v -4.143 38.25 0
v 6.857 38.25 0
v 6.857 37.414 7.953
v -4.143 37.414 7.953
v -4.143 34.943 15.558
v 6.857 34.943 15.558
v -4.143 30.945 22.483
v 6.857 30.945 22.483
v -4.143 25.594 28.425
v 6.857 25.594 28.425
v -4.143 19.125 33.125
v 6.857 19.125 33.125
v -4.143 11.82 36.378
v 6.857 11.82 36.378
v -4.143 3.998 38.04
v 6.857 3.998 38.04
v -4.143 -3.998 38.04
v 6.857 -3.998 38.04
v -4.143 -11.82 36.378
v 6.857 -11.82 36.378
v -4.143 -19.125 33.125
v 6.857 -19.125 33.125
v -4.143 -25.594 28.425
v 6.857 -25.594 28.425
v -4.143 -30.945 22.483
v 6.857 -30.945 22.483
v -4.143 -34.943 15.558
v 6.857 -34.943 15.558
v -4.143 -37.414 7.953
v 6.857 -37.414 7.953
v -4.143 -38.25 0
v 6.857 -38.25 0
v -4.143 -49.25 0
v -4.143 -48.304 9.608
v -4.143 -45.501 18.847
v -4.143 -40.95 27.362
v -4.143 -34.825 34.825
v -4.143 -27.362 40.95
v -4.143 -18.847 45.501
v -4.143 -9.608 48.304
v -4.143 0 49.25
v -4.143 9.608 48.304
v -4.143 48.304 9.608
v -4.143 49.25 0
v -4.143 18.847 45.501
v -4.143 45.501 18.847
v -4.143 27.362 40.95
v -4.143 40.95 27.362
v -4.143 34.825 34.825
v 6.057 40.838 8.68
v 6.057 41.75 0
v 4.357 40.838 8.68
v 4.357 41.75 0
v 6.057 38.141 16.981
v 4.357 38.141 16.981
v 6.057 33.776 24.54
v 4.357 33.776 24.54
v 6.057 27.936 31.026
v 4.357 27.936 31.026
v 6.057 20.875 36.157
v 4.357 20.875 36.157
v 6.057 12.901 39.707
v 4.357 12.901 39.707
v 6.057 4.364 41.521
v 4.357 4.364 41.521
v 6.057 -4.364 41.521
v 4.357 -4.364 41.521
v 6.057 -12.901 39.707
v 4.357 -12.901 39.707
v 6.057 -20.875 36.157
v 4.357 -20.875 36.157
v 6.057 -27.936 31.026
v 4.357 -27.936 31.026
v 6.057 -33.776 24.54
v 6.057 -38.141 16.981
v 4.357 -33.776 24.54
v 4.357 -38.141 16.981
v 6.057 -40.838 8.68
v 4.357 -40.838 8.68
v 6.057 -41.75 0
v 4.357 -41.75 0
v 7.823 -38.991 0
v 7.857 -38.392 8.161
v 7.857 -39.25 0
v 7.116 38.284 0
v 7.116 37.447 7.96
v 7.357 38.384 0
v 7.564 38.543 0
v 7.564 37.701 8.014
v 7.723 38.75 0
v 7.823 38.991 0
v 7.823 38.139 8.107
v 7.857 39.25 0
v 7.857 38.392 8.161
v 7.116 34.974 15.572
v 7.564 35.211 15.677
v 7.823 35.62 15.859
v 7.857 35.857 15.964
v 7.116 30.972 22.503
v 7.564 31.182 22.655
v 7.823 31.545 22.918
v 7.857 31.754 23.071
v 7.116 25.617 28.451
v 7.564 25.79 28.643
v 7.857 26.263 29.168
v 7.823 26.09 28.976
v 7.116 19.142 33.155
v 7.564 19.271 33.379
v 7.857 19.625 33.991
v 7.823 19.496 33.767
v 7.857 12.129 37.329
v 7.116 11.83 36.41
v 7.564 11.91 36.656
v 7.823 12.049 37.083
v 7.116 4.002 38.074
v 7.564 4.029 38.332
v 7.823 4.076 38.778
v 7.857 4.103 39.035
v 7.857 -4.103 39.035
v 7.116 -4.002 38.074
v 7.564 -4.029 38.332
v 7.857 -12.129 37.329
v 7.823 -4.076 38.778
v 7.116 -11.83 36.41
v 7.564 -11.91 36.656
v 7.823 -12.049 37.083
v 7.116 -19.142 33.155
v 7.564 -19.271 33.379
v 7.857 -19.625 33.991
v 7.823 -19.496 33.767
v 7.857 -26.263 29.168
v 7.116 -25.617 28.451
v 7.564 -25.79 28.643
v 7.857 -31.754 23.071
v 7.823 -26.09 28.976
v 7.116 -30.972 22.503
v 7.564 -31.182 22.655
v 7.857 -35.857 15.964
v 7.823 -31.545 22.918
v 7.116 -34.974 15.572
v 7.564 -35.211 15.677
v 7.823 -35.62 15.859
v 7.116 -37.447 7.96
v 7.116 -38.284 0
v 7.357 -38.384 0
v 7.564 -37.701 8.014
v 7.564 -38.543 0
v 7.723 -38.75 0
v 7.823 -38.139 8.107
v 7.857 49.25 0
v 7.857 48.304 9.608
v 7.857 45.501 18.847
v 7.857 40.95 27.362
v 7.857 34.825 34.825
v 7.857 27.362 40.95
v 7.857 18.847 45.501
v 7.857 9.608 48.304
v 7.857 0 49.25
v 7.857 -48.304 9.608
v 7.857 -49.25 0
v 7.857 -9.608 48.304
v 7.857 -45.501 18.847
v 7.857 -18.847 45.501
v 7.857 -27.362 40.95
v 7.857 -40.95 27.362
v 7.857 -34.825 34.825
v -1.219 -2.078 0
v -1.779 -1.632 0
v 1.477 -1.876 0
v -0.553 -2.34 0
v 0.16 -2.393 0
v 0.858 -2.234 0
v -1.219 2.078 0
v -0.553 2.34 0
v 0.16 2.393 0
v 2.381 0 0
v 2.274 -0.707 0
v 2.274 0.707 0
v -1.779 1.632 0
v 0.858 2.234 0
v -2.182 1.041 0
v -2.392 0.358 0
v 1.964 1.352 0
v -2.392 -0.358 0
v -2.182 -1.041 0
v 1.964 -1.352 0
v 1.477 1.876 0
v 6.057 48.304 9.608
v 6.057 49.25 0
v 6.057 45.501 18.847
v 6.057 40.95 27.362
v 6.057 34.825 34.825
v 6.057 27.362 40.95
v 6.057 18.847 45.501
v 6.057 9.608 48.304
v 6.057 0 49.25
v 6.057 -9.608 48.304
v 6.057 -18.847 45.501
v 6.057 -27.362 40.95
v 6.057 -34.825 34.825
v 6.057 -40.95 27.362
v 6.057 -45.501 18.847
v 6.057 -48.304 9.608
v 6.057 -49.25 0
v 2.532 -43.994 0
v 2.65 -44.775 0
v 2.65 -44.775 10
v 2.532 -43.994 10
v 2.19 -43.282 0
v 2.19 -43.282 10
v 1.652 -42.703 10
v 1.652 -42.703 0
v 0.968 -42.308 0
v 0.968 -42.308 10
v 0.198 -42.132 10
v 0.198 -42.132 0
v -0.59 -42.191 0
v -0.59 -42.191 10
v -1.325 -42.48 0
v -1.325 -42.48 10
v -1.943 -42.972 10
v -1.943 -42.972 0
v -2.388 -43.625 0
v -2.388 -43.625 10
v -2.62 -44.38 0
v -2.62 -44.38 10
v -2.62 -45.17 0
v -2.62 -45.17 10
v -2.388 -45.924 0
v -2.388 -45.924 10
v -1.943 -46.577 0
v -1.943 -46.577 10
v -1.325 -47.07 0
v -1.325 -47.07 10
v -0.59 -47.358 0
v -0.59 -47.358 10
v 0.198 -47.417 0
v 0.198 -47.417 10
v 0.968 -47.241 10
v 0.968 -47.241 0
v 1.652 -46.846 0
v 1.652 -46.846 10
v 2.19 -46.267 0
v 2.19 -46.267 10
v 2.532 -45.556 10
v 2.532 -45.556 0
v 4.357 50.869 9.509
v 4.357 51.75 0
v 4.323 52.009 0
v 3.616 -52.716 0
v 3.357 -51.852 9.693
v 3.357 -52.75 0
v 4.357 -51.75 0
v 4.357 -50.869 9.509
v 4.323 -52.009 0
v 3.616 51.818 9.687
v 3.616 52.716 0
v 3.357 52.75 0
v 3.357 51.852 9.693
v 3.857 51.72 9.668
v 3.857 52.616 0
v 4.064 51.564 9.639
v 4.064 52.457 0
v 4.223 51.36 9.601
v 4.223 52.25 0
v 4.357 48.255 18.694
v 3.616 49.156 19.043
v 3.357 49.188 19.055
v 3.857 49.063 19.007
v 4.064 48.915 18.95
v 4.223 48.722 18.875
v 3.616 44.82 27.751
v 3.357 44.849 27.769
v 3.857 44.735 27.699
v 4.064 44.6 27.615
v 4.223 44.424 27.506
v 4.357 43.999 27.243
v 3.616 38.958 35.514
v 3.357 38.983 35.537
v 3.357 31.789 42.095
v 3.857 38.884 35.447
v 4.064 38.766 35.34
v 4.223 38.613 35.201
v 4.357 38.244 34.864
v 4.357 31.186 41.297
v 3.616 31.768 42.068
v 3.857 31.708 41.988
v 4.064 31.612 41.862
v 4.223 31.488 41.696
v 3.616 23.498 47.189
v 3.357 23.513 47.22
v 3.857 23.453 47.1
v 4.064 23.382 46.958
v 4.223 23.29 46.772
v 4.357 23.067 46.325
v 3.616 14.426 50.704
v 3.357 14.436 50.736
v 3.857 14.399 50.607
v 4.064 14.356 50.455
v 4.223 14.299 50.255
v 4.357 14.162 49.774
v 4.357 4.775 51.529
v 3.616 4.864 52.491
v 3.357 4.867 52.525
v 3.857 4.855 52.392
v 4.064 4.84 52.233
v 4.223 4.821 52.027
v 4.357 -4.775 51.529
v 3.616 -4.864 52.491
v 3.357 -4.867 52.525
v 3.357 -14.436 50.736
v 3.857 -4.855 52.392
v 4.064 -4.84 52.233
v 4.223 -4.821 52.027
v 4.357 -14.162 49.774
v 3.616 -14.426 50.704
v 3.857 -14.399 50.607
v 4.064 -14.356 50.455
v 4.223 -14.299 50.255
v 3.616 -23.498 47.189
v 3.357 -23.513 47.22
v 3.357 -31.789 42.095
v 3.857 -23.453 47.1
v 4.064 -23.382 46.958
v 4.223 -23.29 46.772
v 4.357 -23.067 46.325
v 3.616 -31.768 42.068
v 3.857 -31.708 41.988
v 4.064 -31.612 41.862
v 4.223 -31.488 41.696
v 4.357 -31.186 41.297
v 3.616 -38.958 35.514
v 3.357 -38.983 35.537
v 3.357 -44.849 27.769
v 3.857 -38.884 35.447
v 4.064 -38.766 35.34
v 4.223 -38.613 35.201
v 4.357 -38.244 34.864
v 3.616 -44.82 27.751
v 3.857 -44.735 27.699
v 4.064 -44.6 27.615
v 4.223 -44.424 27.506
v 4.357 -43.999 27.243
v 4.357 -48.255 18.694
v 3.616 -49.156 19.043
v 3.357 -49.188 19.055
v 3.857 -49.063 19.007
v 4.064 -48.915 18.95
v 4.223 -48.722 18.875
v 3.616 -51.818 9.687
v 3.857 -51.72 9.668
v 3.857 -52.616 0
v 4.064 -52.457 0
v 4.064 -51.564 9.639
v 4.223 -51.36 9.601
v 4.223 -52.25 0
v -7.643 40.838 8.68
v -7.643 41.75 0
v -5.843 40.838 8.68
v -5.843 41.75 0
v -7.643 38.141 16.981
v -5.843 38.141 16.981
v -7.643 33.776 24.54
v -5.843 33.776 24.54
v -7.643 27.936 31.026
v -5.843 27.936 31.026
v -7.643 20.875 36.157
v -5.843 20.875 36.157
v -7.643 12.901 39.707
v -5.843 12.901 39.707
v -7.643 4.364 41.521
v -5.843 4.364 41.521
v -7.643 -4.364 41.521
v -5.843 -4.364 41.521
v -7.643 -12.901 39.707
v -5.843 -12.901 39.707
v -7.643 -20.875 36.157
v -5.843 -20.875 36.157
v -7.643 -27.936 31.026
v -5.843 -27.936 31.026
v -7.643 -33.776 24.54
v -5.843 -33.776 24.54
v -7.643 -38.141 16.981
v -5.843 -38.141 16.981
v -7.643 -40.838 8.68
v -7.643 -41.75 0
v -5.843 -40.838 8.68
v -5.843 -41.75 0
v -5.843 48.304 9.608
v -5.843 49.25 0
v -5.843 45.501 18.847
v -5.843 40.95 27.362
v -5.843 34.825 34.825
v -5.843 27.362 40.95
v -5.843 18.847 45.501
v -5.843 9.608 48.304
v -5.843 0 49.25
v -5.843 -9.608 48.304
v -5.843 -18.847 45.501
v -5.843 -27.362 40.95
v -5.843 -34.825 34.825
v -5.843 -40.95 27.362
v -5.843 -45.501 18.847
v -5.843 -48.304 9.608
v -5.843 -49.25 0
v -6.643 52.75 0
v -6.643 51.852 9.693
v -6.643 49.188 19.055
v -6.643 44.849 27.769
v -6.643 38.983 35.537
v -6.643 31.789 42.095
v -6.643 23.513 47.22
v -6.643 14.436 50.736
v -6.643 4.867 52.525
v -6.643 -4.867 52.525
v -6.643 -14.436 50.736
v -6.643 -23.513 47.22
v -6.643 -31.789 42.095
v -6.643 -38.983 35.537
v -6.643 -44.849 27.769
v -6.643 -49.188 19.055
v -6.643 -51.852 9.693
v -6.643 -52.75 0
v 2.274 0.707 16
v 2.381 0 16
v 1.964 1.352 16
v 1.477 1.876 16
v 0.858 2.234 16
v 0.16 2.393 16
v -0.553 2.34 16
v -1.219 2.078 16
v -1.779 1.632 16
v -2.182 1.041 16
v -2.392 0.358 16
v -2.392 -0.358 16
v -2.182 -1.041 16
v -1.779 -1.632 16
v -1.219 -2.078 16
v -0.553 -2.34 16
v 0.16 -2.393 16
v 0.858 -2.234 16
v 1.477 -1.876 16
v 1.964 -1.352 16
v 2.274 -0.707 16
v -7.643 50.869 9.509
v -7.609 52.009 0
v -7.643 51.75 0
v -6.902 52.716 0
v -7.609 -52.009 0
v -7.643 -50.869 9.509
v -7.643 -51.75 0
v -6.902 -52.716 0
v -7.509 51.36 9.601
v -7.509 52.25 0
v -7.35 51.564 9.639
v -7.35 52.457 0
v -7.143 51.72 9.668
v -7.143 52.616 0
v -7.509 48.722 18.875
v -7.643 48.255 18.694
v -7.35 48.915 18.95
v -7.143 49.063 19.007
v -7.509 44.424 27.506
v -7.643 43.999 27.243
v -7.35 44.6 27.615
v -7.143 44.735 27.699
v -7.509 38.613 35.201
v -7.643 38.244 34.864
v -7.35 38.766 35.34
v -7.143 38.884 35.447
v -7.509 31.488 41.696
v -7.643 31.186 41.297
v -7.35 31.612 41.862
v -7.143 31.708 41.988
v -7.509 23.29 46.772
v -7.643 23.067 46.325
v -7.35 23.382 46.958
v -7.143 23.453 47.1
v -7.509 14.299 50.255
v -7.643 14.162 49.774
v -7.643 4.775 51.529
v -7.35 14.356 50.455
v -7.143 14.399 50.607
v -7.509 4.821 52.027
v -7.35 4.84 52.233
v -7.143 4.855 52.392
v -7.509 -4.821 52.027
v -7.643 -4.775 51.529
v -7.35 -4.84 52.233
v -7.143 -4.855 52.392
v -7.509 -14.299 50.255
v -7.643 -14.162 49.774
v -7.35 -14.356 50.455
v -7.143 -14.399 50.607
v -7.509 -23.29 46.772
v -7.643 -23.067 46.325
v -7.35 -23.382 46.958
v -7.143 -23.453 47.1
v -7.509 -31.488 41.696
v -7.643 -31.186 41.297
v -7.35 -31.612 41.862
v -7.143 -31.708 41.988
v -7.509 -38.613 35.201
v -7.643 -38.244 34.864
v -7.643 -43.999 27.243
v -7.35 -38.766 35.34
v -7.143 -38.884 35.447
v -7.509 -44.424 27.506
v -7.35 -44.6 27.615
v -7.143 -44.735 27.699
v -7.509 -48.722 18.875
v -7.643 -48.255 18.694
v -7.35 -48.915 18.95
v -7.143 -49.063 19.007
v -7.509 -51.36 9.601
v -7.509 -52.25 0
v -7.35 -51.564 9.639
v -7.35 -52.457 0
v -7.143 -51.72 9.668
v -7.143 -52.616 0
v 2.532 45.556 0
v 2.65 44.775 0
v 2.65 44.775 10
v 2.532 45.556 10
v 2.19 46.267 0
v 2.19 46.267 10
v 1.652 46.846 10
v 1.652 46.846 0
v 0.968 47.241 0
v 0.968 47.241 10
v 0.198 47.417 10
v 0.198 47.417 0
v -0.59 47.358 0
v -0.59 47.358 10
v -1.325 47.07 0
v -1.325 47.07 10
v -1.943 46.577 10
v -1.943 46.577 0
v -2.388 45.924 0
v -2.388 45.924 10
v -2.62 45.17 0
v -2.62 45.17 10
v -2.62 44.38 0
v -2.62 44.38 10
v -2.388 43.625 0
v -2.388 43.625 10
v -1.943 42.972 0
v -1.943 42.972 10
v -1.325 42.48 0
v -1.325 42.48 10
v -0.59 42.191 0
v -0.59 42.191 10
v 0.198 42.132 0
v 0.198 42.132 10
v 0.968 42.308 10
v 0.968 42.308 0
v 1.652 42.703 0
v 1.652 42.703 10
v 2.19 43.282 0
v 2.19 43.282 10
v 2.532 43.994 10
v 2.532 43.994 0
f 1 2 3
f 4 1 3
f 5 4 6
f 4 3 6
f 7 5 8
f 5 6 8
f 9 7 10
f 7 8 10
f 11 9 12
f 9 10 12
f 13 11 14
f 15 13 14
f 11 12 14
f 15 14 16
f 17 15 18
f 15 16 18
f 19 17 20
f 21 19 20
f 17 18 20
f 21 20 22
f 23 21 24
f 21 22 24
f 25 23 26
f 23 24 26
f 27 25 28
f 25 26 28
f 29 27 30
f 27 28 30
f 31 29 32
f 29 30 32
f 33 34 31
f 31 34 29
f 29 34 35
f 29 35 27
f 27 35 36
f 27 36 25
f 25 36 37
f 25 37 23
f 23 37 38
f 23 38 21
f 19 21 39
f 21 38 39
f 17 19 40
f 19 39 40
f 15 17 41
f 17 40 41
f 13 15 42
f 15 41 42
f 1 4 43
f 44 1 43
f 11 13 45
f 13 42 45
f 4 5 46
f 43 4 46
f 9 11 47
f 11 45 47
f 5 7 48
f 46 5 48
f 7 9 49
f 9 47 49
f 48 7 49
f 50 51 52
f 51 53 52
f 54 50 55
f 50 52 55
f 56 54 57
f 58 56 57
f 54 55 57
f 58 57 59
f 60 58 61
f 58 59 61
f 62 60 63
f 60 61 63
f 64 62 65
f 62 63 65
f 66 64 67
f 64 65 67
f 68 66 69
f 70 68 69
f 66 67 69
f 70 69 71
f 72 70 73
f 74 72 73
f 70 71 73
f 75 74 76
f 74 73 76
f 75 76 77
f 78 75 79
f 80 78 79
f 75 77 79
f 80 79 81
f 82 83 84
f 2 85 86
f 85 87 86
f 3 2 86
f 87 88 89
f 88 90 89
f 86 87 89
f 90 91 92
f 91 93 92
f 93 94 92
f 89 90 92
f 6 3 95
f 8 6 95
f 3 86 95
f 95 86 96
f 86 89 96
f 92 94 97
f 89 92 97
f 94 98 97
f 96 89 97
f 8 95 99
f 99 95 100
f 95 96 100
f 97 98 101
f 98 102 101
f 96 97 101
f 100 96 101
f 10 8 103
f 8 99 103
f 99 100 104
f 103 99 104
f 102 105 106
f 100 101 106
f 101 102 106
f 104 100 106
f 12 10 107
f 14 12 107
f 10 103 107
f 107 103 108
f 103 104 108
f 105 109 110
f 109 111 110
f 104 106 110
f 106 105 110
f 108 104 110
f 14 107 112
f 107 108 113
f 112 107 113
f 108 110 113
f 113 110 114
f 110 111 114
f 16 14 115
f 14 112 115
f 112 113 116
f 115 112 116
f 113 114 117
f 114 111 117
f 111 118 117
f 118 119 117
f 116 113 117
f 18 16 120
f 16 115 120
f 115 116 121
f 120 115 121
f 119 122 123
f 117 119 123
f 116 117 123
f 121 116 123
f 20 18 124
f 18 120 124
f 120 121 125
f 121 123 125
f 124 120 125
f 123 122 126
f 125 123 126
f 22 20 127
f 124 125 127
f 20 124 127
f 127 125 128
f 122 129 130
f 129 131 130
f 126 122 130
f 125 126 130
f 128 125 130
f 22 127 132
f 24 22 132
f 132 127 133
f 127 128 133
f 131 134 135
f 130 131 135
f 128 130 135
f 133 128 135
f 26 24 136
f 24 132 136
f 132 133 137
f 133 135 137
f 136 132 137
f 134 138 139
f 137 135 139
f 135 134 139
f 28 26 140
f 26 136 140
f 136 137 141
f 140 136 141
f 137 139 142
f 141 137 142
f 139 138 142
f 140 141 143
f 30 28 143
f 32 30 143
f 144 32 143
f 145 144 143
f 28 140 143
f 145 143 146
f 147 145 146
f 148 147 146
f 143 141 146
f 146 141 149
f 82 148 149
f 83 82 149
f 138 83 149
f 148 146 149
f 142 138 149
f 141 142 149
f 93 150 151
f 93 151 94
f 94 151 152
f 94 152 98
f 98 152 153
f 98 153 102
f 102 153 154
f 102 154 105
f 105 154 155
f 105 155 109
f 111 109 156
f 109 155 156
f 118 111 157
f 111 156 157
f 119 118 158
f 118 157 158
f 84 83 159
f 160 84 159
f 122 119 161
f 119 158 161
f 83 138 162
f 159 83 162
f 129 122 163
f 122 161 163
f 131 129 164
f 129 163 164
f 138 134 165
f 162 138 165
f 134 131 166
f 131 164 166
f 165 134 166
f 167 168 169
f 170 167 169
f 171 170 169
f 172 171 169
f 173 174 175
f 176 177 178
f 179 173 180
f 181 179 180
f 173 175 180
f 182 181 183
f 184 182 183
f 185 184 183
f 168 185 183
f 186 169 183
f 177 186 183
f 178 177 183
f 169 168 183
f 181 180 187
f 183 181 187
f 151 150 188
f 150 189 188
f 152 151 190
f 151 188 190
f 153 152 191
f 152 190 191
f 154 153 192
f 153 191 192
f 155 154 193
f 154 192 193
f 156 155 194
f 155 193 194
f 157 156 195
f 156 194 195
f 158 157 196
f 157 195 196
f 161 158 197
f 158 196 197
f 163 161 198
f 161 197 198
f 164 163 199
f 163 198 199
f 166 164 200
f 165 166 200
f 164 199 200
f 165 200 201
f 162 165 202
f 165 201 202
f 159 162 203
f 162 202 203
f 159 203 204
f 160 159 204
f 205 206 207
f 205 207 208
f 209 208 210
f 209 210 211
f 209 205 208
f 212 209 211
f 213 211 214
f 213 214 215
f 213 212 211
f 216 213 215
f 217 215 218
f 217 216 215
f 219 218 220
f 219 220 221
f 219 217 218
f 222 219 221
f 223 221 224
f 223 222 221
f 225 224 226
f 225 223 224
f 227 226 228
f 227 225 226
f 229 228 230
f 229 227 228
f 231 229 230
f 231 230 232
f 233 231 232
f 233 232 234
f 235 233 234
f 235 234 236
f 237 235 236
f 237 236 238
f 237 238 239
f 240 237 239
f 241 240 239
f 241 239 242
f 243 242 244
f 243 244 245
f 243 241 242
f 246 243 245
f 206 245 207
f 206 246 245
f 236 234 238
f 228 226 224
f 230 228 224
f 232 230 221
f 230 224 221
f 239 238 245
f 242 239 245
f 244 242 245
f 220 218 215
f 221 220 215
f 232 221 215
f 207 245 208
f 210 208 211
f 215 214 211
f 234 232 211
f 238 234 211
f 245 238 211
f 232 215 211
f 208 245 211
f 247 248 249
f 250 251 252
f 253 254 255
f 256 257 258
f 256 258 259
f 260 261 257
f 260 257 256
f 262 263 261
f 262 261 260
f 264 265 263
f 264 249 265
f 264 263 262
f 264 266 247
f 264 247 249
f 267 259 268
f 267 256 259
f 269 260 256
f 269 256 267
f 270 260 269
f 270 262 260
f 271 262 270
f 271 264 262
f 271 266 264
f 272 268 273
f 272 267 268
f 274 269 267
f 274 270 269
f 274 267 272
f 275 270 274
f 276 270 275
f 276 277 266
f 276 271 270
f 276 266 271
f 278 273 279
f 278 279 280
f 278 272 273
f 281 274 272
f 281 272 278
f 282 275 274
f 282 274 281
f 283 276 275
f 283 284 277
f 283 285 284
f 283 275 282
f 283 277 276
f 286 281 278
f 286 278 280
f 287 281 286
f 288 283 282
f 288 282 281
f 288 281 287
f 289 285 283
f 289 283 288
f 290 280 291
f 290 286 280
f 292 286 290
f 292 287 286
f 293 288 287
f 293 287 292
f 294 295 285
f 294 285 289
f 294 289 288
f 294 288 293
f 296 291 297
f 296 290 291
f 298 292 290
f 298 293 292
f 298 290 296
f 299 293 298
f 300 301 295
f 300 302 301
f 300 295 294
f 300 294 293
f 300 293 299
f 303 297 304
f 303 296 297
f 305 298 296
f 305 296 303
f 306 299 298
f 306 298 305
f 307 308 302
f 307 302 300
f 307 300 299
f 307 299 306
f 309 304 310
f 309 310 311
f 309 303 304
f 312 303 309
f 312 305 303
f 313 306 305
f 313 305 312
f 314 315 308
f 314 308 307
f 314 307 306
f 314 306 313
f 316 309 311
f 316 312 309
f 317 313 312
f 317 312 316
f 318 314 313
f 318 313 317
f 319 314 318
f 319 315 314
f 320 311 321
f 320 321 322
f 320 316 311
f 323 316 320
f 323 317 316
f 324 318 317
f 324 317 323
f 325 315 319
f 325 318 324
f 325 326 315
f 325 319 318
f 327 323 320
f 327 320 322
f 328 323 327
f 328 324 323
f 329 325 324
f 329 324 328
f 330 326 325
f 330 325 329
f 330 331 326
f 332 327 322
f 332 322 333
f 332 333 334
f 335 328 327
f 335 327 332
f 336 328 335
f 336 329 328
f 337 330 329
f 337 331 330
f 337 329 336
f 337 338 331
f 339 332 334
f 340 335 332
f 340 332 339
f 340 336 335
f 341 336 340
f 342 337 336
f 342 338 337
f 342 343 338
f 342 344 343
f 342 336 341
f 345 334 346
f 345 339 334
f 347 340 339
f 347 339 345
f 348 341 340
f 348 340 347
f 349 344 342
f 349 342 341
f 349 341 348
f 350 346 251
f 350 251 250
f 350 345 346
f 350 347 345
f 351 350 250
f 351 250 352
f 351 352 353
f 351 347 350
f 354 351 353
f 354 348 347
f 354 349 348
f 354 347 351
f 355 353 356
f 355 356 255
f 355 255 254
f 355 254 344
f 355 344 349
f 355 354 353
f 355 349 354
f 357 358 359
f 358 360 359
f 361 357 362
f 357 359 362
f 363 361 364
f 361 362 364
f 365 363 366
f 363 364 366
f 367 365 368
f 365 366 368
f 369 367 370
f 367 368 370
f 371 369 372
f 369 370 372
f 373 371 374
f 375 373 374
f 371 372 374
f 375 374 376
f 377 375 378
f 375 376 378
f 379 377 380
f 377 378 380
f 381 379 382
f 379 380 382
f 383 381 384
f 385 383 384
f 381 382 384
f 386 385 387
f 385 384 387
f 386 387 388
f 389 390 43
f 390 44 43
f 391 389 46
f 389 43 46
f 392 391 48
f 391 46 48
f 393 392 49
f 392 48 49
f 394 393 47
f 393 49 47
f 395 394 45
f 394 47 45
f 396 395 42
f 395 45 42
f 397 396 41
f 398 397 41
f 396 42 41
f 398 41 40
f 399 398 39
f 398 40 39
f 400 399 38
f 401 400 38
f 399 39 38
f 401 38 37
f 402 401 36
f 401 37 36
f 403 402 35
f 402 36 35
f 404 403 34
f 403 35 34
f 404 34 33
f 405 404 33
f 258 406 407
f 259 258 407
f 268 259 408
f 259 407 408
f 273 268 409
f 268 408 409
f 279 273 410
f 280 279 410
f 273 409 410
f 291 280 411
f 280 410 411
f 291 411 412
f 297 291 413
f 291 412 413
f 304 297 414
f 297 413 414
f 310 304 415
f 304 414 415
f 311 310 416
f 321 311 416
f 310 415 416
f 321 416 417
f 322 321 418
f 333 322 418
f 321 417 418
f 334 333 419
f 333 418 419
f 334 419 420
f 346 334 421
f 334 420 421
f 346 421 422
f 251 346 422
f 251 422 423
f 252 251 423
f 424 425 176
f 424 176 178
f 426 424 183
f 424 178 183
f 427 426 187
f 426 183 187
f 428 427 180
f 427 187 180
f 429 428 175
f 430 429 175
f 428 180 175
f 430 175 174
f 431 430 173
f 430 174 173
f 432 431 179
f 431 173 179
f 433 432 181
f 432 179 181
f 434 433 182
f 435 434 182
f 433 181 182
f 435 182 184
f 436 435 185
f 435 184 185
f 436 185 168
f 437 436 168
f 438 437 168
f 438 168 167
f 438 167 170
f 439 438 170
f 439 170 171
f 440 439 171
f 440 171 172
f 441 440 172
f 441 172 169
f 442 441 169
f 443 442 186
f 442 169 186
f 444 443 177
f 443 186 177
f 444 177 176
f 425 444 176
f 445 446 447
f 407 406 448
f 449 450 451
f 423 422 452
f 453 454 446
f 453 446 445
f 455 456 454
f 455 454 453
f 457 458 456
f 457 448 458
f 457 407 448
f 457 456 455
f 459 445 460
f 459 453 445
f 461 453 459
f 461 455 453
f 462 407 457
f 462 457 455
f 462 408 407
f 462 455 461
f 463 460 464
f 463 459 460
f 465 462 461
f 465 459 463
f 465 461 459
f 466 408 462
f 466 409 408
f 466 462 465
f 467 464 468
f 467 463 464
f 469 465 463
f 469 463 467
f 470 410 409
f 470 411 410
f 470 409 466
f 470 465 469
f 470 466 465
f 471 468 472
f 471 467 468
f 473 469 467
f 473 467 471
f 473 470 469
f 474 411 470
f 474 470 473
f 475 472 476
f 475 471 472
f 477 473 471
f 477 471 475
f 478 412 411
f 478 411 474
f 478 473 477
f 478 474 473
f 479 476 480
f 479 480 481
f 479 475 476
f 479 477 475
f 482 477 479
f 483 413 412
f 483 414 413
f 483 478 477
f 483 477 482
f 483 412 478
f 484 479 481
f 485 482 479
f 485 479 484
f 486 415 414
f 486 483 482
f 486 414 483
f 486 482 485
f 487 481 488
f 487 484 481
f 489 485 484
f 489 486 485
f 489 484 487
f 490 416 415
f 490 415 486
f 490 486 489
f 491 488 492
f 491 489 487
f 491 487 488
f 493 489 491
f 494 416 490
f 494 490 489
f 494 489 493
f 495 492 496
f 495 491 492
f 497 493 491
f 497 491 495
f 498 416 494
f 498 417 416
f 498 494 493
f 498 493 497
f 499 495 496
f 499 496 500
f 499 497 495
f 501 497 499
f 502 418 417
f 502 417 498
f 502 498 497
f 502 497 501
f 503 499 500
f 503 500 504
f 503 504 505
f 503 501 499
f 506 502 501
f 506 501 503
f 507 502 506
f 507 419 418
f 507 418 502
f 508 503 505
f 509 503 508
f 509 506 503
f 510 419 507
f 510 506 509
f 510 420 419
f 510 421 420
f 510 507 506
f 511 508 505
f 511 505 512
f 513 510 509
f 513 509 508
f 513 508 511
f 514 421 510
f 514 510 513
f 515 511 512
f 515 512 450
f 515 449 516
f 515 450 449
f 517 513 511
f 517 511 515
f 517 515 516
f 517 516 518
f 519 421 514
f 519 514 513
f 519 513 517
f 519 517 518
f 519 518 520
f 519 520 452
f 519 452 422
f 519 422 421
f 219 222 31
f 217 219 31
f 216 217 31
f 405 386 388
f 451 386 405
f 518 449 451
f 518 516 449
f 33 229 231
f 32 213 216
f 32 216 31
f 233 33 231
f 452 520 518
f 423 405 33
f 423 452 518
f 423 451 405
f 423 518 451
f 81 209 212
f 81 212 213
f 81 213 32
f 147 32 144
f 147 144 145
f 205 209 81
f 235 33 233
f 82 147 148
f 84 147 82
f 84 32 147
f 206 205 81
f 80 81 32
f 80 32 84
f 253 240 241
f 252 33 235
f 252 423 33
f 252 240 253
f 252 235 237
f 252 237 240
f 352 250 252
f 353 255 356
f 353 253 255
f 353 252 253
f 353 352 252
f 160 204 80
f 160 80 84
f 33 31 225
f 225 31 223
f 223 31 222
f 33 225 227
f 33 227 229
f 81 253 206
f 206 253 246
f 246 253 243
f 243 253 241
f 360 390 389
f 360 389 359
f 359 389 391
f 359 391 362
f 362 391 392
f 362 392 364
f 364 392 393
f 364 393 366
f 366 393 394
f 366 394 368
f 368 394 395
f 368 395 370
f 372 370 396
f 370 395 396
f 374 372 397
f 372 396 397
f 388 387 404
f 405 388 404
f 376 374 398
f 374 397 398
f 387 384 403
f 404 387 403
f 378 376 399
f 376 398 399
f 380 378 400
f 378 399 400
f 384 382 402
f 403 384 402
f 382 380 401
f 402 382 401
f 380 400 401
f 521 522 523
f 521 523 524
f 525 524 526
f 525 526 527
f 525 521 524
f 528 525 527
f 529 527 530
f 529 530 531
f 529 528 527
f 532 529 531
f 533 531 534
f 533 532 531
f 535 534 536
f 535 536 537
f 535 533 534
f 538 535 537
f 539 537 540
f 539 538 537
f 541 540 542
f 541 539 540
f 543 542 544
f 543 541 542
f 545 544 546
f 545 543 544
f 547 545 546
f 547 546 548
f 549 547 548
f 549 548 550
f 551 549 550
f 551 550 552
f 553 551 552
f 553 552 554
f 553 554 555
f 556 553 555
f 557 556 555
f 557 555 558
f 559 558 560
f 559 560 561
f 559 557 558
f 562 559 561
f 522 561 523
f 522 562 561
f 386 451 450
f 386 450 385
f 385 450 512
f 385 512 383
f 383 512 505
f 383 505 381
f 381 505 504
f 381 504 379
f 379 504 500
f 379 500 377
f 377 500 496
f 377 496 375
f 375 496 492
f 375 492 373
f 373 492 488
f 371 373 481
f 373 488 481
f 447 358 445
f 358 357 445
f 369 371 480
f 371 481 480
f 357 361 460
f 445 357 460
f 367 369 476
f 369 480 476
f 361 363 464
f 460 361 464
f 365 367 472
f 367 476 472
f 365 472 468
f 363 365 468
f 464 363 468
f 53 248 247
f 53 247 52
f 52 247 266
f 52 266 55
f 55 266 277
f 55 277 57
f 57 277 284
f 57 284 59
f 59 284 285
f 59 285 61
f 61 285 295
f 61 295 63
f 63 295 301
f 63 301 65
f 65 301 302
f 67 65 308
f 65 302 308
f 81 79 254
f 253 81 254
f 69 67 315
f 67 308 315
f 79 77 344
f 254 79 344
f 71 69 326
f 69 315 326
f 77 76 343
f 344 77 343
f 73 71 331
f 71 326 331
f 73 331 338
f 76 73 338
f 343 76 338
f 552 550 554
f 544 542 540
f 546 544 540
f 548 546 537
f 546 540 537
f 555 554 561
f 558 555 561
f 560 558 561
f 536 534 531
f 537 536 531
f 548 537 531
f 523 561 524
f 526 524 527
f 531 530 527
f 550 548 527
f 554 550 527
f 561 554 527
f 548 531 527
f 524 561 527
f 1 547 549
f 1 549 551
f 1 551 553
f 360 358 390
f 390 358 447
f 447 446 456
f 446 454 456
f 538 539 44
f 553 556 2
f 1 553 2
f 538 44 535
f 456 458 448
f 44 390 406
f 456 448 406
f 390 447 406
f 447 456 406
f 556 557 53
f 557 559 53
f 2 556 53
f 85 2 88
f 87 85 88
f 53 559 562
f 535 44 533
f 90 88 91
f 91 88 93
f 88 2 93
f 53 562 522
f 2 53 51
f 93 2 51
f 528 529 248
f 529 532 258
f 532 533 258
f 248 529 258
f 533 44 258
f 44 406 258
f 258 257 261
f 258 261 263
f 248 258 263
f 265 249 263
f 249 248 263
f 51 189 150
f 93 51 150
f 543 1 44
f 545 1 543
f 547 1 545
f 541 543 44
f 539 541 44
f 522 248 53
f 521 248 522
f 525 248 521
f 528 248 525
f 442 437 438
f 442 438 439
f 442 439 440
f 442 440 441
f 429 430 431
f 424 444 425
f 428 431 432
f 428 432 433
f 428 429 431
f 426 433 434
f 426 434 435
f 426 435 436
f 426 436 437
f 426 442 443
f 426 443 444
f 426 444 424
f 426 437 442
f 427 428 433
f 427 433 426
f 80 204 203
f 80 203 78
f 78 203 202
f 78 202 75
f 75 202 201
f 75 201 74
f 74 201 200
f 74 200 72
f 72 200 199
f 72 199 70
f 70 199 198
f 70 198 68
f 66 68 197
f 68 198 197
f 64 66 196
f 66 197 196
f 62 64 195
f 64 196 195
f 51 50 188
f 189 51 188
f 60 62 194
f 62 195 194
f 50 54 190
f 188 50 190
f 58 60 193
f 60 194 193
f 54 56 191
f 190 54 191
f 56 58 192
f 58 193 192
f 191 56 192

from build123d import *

# Parameters (mm, degrees)
F1_ANGLE = 180
F2_R     = 2.65
F3_DEPTH = 10
F4_R     = 2.4
F5_DEPTH = 16
F6_R     = 1


# Not quite as in the source:
# - a feature names something its author has since deleted; it is built from what else it names


with BuildPart() as f1:
    # F0 (on Top) → F1 (revolve)
    with BuildSketch(Plane.XY):
        Polygon((-7.6431803294, 52.75), (-7.6431803294, 41.75), (-5.8431803294, 41.75), (-5.8431803294, 49.25), (-4.1431803294, 49.25), (-4.1431803294, 38.25), (7.8568196706, 38.25), (7.8568196706, 49.25), (6.0568196706, 49.25), (6.0568196706, 41.75), (4.3568196706, 41.75), (4.3568196706, 52.75), align=None)
    revolve(axis=Axis((-8.8856732473, 0, 0), (1, 0, 0)), revolution_arc=F1_ANGLE)

    # F2 (on Top) → F3 (cut)
    with BuildSketch(Plane.XY):
        with Locations((0, 44.7746068239)):
            Circle(F2_R)
        with Locations((0, -44.7746068239)):
            Circle(F2_R)
    extrude(amount=F3_DEPTH, mode=Mode.SUBTRACT)

    # F6
    f6_edges = [f1.edges().sort_by_distance(p)[0] for p in [
        (7.85682, 0, 38.25),
        (4.35682, 0, 52.75),
        (-7.64318, 0, 52.75),
    ]]
    fillet(f6_edges, radius=F6_R)


with BuildPart() as f5:
    # F4 (on Top) → F5 (new body)
    with BuildSketch(Plane.XY):
        with Locations((-0.019186803, 0)):
            Circle(F4_R)
    extrude(amount=F5_DEPTH)


solid = Compound([f1.part, f5.part])
